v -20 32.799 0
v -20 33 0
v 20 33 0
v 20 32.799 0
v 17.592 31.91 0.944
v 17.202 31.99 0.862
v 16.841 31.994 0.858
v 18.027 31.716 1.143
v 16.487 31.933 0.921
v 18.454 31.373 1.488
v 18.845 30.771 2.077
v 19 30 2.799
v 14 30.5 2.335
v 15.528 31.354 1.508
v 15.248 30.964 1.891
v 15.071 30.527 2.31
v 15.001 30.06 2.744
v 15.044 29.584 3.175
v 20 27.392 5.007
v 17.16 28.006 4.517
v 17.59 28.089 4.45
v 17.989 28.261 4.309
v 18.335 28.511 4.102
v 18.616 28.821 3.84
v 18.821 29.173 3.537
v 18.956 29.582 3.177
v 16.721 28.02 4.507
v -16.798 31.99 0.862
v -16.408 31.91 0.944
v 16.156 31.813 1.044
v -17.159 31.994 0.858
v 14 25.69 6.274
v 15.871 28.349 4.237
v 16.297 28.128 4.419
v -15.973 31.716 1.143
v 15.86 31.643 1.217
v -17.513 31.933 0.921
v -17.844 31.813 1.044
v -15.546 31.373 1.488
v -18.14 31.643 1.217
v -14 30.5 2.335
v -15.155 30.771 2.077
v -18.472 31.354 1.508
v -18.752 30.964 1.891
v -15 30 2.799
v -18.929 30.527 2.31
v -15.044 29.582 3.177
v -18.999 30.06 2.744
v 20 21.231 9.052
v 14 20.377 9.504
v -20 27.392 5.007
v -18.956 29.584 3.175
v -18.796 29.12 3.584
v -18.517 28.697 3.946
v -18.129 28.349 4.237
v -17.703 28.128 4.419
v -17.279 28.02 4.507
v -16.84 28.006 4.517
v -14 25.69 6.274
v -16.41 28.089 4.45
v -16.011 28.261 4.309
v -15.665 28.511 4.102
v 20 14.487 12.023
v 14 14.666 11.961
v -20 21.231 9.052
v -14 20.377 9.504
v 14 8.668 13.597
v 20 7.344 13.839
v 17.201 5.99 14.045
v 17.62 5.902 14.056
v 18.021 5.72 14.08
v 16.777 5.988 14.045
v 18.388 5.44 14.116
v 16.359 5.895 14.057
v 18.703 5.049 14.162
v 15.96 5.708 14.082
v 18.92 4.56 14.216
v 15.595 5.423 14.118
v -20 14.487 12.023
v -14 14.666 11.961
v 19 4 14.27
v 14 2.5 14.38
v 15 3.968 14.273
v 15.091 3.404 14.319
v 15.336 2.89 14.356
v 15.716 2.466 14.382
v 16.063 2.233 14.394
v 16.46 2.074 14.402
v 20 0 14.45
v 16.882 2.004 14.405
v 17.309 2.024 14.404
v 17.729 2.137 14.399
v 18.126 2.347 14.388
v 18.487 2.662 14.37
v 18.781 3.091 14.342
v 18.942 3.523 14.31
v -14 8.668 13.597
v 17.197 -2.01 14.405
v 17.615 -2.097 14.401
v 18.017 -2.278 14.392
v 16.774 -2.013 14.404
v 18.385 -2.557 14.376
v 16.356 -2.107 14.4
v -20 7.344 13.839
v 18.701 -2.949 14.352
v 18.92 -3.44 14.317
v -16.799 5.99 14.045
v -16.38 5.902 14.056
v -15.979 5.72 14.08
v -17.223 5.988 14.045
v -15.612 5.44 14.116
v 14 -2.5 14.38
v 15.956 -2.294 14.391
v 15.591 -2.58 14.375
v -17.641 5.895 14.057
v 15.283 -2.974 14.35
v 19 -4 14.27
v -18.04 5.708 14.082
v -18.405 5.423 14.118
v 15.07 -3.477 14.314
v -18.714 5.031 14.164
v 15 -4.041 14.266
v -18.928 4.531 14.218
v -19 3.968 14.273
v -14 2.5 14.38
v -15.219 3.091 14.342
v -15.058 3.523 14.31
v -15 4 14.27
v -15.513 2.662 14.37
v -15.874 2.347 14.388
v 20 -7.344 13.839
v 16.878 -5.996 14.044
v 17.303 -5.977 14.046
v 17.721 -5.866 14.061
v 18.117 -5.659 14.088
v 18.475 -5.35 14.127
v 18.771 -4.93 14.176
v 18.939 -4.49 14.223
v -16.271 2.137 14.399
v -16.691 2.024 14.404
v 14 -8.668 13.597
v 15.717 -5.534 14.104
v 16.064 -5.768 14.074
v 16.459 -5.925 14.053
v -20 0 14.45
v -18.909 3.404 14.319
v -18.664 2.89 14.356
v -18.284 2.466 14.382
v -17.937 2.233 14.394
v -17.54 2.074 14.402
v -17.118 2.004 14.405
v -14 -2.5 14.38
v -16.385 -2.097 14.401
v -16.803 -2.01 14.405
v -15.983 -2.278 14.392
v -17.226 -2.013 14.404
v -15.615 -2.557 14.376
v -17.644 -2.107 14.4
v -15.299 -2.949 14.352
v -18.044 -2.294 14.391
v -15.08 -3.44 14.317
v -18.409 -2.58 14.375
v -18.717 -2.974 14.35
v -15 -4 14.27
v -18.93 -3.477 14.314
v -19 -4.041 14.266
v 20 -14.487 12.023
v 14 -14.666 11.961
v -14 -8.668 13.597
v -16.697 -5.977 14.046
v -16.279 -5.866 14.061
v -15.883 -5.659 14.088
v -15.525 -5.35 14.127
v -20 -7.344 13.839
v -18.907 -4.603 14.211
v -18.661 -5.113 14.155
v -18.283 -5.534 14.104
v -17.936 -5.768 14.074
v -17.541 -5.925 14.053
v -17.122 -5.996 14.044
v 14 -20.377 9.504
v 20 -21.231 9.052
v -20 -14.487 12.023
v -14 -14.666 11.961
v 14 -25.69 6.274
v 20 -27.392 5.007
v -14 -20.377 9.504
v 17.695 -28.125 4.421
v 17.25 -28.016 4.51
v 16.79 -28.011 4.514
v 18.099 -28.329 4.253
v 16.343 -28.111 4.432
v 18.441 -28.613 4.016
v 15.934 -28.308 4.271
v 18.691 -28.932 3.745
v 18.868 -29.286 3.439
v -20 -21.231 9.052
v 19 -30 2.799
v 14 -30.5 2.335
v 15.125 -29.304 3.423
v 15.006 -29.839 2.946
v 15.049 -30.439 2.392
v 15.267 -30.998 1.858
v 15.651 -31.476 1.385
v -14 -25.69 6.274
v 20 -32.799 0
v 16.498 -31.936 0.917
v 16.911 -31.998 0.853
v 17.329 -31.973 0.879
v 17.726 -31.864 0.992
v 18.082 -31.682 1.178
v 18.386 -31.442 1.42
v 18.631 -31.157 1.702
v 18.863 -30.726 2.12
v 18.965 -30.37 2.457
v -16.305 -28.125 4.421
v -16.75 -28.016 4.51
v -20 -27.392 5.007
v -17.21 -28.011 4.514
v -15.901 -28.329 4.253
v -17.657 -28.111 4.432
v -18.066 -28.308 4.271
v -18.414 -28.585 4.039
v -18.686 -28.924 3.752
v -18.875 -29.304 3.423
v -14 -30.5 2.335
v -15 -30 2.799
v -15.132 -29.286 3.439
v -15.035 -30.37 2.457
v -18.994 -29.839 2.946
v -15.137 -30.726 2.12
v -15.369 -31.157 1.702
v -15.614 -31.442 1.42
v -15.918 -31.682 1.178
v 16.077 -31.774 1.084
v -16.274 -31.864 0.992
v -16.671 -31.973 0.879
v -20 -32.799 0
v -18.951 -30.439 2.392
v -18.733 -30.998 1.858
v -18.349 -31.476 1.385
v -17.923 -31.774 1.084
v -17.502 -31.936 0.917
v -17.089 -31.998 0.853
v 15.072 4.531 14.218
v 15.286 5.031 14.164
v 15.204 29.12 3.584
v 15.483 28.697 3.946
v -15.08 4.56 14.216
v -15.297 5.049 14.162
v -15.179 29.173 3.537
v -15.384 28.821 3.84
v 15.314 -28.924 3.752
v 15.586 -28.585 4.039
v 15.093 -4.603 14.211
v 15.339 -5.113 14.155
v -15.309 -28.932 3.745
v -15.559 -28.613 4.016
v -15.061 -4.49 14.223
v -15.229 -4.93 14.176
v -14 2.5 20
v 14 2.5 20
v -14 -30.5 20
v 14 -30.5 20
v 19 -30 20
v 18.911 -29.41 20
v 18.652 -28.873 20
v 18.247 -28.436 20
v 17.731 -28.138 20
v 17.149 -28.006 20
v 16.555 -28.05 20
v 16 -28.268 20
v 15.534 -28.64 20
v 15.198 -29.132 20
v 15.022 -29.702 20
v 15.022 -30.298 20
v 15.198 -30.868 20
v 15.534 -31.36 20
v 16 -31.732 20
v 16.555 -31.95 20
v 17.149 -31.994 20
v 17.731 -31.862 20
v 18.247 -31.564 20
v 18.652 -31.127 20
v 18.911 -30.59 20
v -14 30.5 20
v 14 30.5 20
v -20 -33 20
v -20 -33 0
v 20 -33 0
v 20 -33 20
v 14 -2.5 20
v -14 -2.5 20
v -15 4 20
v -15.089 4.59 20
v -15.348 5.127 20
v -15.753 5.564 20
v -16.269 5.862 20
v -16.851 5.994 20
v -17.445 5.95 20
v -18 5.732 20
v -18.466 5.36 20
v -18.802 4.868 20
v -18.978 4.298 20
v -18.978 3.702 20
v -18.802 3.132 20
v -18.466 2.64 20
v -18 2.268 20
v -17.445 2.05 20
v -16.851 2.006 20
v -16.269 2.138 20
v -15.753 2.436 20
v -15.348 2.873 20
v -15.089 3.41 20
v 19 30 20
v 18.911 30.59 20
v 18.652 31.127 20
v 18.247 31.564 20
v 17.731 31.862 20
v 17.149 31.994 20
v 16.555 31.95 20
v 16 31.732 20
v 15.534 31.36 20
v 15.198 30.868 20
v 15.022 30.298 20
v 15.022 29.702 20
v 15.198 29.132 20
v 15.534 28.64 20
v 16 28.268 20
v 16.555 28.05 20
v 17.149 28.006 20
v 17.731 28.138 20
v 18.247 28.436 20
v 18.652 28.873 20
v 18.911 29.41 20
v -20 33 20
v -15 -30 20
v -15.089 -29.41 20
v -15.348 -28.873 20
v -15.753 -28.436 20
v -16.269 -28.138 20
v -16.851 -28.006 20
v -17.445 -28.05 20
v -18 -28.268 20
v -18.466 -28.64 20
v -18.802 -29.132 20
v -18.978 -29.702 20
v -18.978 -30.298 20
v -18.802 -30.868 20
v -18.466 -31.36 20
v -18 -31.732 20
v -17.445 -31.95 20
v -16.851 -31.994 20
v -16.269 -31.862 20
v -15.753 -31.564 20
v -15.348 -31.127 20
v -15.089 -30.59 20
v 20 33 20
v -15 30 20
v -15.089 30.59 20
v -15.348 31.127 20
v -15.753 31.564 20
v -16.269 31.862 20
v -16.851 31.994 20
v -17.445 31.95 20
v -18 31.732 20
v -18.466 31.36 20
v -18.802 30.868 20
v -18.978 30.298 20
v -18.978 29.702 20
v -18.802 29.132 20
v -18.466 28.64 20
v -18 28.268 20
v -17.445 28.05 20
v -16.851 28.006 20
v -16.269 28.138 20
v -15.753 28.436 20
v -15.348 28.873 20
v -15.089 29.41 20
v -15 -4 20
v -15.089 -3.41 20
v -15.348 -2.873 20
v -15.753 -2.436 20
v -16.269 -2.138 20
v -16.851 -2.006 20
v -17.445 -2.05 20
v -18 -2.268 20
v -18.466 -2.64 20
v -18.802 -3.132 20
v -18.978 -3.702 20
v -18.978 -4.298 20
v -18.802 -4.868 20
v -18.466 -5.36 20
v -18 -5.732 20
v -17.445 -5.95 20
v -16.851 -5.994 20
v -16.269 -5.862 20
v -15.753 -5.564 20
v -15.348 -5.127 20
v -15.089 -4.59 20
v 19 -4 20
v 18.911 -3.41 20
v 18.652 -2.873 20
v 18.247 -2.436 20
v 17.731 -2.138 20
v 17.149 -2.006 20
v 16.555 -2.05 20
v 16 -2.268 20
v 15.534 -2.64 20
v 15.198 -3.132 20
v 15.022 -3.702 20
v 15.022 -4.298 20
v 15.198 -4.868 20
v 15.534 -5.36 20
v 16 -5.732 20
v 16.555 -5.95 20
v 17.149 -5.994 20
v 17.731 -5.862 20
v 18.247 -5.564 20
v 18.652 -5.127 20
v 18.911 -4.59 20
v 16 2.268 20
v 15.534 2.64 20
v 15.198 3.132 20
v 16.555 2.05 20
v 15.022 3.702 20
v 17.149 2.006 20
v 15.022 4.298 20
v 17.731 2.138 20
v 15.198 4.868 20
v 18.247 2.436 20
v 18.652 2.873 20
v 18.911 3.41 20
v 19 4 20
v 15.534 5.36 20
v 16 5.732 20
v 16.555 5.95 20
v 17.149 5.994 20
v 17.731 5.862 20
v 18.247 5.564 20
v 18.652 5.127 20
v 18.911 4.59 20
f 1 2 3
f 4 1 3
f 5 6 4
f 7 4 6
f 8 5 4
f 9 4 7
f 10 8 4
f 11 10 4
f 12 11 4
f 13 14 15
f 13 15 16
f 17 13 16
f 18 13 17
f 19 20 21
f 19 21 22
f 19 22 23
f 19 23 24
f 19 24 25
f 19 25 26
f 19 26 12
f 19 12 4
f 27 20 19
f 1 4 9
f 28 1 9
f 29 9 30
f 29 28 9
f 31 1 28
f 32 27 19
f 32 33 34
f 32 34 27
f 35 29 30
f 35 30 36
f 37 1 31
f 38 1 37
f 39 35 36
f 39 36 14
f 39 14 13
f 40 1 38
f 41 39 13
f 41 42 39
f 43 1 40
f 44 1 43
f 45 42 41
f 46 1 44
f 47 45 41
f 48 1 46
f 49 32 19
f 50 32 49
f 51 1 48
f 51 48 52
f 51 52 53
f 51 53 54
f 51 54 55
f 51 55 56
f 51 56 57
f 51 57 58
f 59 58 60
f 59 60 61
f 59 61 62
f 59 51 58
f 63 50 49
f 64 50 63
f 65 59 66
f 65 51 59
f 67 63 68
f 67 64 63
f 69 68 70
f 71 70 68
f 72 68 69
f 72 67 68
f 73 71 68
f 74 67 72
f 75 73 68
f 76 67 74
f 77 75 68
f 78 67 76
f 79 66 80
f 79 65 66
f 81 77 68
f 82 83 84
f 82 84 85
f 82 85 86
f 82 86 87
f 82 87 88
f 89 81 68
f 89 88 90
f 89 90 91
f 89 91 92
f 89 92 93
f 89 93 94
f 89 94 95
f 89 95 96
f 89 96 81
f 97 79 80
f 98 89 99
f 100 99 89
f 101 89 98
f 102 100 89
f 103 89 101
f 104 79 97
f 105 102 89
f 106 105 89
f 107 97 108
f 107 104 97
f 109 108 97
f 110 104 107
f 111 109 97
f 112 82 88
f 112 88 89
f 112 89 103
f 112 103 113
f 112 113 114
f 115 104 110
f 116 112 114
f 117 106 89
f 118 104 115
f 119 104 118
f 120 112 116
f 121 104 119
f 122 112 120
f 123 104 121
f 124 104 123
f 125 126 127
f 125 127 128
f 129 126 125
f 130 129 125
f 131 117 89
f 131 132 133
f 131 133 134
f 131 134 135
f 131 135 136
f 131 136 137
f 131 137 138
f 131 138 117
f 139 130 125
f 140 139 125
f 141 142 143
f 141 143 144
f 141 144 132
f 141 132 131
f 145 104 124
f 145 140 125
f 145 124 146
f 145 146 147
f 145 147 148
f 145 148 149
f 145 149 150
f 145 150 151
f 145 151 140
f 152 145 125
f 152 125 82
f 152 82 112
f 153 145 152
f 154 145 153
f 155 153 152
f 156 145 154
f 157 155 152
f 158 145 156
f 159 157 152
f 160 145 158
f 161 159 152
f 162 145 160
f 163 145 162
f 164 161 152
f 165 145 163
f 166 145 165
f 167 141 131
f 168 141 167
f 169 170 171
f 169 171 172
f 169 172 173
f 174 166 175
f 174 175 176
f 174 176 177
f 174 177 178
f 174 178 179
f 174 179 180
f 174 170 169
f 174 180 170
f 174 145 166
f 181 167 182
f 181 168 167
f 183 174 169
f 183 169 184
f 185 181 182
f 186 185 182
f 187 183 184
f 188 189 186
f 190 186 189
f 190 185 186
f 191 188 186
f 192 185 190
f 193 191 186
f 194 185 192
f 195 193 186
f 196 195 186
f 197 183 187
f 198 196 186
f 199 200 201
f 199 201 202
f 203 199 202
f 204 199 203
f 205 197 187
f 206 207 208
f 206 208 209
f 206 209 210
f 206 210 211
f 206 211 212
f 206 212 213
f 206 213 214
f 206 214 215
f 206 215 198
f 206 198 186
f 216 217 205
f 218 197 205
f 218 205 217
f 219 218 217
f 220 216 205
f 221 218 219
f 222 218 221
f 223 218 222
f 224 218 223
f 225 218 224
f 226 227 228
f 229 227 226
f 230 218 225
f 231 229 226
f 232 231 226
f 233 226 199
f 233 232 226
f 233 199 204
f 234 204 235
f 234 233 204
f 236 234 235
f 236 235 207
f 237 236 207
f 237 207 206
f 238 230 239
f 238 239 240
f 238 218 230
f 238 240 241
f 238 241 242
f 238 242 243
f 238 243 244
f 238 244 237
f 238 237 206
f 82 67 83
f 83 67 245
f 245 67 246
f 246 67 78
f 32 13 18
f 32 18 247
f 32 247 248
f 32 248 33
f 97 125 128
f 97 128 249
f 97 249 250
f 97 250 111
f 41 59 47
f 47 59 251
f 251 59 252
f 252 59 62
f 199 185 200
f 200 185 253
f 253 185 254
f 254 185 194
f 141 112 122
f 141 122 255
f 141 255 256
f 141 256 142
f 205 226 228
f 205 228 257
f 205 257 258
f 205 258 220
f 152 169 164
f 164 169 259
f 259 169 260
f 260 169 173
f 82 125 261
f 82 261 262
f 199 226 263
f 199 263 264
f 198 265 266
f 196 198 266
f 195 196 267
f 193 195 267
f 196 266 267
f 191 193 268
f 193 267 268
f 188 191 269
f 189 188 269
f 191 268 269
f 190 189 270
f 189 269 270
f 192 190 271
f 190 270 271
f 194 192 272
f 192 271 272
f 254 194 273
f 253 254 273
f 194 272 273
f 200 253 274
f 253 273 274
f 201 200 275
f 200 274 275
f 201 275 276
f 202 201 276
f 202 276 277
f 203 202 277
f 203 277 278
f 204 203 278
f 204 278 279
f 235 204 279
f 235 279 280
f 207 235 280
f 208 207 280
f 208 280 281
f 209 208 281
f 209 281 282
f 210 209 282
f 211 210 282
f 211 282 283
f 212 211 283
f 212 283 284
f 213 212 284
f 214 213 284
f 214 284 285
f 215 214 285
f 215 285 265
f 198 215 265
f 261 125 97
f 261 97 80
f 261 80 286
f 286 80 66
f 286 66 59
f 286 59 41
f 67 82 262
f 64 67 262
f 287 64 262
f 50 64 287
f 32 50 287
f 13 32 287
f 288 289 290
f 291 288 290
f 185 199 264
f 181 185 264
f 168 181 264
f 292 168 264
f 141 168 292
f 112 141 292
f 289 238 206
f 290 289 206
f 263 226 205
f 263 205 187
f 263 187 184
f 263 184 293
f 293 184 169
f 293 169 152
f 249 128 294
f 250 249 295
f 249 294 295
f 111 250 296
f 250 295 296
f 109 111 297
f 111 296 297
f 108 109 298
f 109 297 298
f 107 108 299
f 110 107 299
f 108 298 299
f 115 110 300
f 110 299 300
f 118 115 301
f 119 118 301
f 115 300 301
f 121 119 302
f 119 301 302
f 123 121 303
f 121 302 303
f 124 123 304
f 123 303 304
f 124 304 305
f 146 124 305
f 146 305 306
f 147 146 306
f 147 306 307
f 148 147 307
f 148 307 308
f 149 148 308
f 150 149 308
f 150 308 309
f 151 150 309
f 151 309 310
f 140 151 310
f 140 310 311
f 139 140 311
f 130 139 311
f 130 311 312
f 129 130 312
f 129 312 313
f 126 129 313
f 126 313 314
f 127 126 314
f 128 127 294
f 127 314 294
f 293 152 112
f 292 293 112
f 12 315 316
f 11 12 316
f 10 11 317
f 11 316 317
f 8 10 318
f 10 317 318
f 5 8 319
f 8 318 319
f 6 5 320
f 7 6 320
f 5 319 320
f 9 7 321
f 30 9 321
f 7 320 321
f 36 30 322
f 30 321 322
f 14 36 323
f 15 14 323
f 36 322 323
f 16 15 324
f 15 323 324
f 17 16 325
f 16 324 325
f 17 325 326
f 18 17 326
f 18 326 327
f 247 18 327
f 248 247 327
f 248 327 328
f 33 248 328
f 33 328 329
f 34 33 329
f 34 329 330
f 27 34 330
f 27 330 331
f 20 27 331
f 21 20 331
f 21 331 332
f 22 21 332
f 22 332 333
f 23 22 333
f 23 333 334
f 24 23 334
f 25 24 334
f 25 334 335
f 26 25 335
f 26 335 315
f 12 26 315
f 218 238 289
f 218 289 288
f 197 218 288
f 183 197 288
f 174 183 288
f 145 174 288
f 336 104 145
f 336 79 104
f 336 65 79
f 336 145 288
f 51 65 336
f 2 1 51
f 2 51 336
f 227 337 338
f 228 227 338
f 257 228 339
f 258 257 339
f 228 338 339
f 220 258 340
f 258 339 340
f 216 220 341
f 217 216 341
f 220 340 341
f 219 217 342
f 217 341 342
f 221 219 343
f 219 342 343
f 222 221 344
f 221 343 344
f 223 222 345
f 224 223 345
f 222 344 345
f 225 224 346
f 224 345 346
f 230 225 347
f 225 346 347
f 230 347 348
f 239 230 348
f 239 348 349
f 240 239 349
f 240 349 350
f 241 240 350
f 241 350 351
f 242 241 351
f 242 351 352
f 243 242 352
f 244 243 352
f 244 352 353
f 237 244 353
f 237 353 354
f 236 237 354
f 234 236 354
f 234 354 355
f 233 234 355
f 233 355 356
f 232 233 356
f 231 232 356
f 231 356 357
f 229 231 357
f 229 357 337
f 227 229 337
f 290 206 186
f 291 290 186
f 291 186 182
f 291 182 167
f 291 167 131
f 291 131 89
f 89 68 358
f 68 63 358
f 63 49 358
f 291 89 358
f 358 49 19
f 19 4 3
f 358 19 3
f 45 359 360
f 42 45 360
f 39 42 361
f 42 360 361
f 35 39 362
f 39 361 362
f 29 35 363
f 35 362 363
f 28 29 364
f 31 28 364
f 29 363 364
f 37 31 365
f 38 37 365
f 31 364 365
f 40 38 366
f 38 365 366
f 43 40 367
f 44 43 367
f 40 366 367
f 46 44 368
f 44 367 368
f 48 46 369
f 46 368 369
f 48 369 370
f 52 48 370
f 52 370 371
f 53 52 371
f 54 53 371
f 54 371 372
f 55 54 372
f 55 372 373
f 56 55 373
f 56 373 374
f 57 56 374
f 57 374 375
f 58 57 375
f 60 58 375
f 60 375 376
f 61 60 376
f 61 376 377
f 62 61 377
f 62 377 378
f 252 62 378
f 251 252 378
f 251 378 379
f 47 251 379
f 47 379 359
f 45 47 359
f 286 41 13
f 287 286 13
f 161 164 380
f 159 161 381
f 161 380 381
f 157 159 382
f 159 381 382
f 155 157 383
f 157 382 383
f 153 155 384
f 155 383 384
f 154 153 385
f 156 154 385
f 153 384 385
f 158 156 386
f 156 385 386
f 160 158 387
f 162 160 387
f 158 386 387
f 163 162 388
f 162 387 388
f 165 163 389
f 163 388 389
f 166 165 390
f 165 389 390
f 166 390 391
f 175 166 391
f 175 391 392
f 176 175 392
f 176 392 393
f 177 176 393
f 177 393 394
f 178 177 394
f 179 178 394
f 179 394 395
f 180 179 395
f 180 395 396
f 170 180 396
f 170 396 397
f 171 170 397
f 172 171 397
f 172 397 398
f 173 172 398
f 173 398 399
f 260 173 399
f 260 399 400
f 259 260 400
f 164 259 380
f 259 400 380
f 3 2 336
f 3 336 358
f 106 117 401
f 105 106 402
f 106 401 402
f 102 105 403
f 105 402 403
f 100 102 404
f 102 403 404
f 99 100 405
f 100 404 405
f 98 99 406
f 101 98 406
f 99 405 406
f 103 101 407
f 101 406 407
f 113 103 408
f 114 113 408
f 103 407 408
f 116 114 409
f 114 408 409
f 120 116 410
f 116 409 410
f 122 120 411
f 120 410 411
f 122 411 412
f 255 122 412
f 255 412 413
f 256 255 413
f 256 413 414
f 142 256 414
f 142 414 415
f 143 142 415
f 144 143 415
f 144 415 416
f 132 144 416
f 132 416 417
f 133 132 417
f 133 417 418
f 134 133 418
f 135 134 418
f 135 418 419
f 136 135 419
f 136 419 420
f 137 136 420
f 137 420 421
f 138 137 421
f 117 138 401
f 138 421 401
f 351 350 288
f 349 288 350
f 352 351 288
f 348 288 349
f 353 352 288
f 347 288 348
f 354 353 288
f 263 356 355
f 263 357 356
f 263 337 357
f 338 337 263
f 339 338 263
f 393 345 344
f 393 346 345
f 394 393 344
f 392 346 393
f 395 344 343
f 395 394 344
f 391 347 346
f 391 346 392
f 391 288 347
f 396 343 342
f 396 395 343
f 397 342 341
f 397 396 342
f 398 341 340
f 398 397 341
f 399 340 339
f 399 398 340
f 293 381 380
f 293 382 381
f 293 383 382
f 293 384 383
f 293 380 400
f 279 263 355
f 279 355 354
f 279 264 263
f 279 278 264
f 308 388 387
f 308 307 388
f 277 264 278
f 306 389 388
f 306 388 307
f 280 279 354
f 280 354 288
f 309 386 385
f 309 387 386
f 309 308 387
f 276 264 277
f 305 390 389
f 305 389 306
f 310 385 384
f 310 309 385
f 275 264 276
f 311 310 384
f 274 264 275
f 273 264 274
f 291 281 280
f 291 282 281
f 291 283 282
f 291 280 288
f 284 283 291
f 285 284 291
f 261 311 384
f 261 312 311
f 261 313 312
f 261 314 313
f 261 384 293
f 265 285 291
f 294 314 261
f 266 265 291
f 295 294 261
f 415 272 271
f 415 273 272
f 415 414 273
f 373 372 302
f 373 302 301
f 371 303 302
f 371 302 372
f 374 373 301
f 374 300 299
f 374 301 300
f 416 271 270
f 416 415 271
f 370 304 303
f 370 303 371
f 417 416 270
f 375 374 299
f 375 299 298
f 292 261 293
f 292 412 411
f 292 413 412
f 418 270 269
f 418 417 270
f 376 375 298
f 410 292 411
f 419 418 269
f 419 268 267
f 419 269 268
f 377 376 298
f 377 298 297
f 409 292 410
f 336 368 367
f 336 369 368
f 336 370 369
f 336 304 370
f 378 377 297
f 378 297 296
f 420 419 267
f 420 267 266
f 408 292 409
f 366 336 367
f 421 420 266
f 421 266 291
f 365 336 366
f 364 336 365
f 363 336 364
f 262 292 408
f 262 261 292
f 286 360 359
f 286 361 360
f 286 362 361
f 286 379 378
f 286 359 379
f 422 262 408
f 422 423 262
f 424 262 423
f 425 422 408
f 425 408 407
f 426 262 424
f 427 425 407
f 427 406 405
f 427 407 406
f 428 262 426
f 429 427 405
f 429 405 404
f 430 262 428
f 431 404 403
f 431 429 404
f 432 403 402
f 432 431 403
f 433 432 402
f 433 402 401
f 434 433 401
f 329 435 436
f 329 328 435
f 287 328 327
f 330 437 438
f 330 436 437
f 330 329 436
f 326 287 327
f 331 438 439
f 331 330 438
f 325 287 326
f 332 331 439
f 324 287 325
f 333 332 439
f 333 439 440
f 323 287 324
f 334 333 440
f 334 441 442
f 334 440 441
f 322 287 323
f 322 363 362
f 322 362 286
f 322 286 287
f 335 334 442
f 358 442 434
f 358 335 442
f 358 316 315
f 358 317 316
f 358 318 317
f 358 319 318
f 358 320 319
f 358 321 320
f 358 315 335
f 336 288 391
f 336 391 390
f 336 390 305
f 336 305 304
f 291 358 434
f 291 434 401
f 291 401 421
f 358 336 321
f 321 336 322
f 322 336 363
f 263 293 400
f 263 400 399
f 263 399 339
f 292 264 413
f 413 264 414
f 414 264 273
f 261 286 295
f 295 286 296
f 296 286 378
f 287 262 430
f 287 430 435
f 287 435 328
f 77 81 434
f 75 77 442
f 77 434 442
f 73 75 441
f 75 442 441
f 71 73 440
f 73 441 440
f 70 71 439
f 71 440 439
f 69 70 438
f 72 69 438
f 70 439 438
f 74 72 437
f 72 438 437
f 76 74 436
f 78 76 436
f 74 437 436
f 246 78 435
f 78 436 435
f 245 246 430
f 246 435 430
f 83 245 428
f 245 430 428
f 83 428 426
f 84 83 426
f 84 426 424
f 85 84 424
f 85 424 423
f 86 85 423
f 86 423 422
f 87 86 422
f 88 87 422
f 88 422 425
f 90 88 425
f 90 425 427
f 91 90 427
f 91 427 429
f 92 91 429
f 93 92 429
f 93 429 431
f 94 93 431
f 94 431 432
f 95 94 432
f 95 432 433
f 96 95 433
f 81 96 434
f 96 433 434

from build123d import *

# Parameters (mm, degrees)
SKETCH1_W               = 40
SKETCH1_H               = 66
SKETCH1_W_2             = 28
SKETCH1_H_2             = 28
BOSS_EXTRUDE1_DEPTH     = 20
CUT_EXTRUDE1_DEPTH      = 26
CUT_EXTRUDE1_DEPTH_BACK = 27
SKETCH3_R               = 44.45
SKETCH4_R               = 2
CUT_EXTRUDE2_DEPTH      = 27
SKETCH5_R               = 2
CUT_EXTRUDE3_DEPTH      = 44.462627716


with BuildPart() as part:
    # Sketch1 → Boss-Extrude1 (new body)
    with BuildSketch(Plane.XY):
        Rectangle(SKETCH1_W, SKETCH1_H)
        with Locations((0, 16.5)):
            Rectangle(SKETCH1_W_2, SKETCH1_H_2, mode=Mode.SUBTRACT)
        with Locations((0, -16.5)):
            Rectangle(SKETCH1_W_2, SKETCH1_H_2, mode=Mode.SUBTRACT)
    extrude(amount=BOSS_EXTRUDE1_DEPTH)

    # Sketch3 → Cut-Extrude1 (cut, two sides: drawn at the far end of the back side and taken through both)
    with BuildSketch(Plane(origin=(0, 0, 0), x_dir=(0, 0, -1), z_dir=(1, 0, 0)).offset(-CUT_EXTRUDE1_DEPTH_BACK)):
        with Locations((30, 0)):
            Circle(SKETCH3_R)
    extrude(amount=CUT_EXTRUDE1_DEPTH + CUT_EXTRUDE1_DEPTH_BACK, mode=Mode.SUBTRACT)

    # Sketch4 → Cut-Extrude2 (cut)
    with BuildSketch(Plane.XY.offset(20)):
        with Locations((-17, 30)):
            Circle(SKETCH4_R)
        with Locations((17, 30)):
            Circle(SKETCH4_R)
        with Locations((-17, -30)):
            Circle(SKETCH4_R)
        with Locations((17, -30)):
            Circle(SKETCH4_R)
    extrude(amount=-CUT_EXTRUDE2_DEPTH, mode=Mode.SUBTRACT)

    # Sketch5 → Cut-Extrude3 (cut, through all)
    with BuildSketch(Plane.XY.offset(20)):
        with Locations((-17, 4)):
            Circle(SKETCH5_R)
        with Locations((-17, -4)):
            Circle(SKETCH5_R)
        with Locations((17, 4)):
            Circle(SKETCH5_R)
        with Locations((17, -4)):
            Circle(SKETCH5_R)
    extrude(amount=-CUT_EXTRUDE3_DEPTH, mode=Mode.SUBTRACT)


solid = part.part
